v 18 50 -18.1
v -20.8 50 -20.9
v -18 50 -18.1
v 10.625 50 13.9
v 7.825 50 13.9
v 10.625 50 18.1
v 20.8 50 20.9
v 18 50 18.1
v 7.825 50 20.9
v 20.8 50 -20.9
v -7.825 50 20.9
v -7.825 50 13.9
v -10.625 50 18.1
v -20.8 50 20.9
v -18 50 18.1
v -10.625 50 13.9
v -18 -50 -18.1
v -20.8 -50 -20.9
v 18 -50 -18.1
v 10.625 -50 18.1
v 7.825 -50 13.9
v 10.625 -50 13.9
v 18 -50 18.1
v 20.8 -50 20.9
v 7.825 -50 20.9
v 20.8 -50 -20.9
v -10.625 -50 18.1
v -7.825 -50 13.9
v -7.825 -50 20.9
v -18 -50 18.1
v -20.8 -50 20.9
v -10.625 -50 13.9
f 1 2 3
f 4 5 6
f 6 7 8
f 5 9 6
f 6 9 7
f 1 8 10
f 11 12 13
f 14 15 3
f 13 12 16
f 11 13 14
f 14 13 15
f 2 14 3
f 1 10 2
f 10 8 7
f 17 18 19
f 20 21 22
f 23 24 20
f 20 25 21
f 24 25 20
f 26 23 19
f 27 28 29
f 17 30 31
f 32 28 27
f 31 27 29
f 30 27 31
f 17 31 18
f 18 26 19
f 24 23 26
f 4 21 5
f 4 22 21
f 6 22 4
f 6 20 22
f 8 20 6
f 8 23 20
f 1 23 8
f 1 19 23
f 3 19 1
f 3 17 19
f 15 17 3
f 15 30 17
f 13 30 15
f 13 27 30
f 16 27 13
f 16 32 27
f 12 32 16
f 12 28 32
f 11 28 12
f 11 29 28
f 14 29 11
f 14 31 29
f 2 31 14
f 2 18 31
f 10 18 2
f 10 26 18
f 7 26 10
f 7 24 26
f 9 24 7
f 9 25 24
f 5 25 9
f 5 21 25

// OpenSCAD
railWidth = 41.6;
railHeight = 41.8;
railThickness = 2.8;

module rail(length = 100){
  color([180 / 255, 170 / 255, 150 / 255]){
    rotate([90, 0, 0]){
      translate([0, 0, -length / 2]){
        linear_extrude(height = length){
          union(){
            difference(){
              difference(){
                square(size = [railWidth, railHeight], center = true);
                square(size = [railWidth - (railThickness * 2), railHeight - (railThickness * 2)], center = true);
              }
              translate([0, railWidth / 2, 0]){
                square(size = [21.25, 7], center = true);
              }
            }
            translate([0, (railHeight / 2) - (7 / 2), 0]){
              translate([(21.25 / 2) - 1.4, 0, 0]){
                square(size = [railThickness, 7], center = true);
              }
              translate([-(21.25 / 2) + 1.4, 0, 0]){
                square(size = [railThickness, 7], center = true);
              }
            }
          }
        }
      }
    }
  }
}
rail();
